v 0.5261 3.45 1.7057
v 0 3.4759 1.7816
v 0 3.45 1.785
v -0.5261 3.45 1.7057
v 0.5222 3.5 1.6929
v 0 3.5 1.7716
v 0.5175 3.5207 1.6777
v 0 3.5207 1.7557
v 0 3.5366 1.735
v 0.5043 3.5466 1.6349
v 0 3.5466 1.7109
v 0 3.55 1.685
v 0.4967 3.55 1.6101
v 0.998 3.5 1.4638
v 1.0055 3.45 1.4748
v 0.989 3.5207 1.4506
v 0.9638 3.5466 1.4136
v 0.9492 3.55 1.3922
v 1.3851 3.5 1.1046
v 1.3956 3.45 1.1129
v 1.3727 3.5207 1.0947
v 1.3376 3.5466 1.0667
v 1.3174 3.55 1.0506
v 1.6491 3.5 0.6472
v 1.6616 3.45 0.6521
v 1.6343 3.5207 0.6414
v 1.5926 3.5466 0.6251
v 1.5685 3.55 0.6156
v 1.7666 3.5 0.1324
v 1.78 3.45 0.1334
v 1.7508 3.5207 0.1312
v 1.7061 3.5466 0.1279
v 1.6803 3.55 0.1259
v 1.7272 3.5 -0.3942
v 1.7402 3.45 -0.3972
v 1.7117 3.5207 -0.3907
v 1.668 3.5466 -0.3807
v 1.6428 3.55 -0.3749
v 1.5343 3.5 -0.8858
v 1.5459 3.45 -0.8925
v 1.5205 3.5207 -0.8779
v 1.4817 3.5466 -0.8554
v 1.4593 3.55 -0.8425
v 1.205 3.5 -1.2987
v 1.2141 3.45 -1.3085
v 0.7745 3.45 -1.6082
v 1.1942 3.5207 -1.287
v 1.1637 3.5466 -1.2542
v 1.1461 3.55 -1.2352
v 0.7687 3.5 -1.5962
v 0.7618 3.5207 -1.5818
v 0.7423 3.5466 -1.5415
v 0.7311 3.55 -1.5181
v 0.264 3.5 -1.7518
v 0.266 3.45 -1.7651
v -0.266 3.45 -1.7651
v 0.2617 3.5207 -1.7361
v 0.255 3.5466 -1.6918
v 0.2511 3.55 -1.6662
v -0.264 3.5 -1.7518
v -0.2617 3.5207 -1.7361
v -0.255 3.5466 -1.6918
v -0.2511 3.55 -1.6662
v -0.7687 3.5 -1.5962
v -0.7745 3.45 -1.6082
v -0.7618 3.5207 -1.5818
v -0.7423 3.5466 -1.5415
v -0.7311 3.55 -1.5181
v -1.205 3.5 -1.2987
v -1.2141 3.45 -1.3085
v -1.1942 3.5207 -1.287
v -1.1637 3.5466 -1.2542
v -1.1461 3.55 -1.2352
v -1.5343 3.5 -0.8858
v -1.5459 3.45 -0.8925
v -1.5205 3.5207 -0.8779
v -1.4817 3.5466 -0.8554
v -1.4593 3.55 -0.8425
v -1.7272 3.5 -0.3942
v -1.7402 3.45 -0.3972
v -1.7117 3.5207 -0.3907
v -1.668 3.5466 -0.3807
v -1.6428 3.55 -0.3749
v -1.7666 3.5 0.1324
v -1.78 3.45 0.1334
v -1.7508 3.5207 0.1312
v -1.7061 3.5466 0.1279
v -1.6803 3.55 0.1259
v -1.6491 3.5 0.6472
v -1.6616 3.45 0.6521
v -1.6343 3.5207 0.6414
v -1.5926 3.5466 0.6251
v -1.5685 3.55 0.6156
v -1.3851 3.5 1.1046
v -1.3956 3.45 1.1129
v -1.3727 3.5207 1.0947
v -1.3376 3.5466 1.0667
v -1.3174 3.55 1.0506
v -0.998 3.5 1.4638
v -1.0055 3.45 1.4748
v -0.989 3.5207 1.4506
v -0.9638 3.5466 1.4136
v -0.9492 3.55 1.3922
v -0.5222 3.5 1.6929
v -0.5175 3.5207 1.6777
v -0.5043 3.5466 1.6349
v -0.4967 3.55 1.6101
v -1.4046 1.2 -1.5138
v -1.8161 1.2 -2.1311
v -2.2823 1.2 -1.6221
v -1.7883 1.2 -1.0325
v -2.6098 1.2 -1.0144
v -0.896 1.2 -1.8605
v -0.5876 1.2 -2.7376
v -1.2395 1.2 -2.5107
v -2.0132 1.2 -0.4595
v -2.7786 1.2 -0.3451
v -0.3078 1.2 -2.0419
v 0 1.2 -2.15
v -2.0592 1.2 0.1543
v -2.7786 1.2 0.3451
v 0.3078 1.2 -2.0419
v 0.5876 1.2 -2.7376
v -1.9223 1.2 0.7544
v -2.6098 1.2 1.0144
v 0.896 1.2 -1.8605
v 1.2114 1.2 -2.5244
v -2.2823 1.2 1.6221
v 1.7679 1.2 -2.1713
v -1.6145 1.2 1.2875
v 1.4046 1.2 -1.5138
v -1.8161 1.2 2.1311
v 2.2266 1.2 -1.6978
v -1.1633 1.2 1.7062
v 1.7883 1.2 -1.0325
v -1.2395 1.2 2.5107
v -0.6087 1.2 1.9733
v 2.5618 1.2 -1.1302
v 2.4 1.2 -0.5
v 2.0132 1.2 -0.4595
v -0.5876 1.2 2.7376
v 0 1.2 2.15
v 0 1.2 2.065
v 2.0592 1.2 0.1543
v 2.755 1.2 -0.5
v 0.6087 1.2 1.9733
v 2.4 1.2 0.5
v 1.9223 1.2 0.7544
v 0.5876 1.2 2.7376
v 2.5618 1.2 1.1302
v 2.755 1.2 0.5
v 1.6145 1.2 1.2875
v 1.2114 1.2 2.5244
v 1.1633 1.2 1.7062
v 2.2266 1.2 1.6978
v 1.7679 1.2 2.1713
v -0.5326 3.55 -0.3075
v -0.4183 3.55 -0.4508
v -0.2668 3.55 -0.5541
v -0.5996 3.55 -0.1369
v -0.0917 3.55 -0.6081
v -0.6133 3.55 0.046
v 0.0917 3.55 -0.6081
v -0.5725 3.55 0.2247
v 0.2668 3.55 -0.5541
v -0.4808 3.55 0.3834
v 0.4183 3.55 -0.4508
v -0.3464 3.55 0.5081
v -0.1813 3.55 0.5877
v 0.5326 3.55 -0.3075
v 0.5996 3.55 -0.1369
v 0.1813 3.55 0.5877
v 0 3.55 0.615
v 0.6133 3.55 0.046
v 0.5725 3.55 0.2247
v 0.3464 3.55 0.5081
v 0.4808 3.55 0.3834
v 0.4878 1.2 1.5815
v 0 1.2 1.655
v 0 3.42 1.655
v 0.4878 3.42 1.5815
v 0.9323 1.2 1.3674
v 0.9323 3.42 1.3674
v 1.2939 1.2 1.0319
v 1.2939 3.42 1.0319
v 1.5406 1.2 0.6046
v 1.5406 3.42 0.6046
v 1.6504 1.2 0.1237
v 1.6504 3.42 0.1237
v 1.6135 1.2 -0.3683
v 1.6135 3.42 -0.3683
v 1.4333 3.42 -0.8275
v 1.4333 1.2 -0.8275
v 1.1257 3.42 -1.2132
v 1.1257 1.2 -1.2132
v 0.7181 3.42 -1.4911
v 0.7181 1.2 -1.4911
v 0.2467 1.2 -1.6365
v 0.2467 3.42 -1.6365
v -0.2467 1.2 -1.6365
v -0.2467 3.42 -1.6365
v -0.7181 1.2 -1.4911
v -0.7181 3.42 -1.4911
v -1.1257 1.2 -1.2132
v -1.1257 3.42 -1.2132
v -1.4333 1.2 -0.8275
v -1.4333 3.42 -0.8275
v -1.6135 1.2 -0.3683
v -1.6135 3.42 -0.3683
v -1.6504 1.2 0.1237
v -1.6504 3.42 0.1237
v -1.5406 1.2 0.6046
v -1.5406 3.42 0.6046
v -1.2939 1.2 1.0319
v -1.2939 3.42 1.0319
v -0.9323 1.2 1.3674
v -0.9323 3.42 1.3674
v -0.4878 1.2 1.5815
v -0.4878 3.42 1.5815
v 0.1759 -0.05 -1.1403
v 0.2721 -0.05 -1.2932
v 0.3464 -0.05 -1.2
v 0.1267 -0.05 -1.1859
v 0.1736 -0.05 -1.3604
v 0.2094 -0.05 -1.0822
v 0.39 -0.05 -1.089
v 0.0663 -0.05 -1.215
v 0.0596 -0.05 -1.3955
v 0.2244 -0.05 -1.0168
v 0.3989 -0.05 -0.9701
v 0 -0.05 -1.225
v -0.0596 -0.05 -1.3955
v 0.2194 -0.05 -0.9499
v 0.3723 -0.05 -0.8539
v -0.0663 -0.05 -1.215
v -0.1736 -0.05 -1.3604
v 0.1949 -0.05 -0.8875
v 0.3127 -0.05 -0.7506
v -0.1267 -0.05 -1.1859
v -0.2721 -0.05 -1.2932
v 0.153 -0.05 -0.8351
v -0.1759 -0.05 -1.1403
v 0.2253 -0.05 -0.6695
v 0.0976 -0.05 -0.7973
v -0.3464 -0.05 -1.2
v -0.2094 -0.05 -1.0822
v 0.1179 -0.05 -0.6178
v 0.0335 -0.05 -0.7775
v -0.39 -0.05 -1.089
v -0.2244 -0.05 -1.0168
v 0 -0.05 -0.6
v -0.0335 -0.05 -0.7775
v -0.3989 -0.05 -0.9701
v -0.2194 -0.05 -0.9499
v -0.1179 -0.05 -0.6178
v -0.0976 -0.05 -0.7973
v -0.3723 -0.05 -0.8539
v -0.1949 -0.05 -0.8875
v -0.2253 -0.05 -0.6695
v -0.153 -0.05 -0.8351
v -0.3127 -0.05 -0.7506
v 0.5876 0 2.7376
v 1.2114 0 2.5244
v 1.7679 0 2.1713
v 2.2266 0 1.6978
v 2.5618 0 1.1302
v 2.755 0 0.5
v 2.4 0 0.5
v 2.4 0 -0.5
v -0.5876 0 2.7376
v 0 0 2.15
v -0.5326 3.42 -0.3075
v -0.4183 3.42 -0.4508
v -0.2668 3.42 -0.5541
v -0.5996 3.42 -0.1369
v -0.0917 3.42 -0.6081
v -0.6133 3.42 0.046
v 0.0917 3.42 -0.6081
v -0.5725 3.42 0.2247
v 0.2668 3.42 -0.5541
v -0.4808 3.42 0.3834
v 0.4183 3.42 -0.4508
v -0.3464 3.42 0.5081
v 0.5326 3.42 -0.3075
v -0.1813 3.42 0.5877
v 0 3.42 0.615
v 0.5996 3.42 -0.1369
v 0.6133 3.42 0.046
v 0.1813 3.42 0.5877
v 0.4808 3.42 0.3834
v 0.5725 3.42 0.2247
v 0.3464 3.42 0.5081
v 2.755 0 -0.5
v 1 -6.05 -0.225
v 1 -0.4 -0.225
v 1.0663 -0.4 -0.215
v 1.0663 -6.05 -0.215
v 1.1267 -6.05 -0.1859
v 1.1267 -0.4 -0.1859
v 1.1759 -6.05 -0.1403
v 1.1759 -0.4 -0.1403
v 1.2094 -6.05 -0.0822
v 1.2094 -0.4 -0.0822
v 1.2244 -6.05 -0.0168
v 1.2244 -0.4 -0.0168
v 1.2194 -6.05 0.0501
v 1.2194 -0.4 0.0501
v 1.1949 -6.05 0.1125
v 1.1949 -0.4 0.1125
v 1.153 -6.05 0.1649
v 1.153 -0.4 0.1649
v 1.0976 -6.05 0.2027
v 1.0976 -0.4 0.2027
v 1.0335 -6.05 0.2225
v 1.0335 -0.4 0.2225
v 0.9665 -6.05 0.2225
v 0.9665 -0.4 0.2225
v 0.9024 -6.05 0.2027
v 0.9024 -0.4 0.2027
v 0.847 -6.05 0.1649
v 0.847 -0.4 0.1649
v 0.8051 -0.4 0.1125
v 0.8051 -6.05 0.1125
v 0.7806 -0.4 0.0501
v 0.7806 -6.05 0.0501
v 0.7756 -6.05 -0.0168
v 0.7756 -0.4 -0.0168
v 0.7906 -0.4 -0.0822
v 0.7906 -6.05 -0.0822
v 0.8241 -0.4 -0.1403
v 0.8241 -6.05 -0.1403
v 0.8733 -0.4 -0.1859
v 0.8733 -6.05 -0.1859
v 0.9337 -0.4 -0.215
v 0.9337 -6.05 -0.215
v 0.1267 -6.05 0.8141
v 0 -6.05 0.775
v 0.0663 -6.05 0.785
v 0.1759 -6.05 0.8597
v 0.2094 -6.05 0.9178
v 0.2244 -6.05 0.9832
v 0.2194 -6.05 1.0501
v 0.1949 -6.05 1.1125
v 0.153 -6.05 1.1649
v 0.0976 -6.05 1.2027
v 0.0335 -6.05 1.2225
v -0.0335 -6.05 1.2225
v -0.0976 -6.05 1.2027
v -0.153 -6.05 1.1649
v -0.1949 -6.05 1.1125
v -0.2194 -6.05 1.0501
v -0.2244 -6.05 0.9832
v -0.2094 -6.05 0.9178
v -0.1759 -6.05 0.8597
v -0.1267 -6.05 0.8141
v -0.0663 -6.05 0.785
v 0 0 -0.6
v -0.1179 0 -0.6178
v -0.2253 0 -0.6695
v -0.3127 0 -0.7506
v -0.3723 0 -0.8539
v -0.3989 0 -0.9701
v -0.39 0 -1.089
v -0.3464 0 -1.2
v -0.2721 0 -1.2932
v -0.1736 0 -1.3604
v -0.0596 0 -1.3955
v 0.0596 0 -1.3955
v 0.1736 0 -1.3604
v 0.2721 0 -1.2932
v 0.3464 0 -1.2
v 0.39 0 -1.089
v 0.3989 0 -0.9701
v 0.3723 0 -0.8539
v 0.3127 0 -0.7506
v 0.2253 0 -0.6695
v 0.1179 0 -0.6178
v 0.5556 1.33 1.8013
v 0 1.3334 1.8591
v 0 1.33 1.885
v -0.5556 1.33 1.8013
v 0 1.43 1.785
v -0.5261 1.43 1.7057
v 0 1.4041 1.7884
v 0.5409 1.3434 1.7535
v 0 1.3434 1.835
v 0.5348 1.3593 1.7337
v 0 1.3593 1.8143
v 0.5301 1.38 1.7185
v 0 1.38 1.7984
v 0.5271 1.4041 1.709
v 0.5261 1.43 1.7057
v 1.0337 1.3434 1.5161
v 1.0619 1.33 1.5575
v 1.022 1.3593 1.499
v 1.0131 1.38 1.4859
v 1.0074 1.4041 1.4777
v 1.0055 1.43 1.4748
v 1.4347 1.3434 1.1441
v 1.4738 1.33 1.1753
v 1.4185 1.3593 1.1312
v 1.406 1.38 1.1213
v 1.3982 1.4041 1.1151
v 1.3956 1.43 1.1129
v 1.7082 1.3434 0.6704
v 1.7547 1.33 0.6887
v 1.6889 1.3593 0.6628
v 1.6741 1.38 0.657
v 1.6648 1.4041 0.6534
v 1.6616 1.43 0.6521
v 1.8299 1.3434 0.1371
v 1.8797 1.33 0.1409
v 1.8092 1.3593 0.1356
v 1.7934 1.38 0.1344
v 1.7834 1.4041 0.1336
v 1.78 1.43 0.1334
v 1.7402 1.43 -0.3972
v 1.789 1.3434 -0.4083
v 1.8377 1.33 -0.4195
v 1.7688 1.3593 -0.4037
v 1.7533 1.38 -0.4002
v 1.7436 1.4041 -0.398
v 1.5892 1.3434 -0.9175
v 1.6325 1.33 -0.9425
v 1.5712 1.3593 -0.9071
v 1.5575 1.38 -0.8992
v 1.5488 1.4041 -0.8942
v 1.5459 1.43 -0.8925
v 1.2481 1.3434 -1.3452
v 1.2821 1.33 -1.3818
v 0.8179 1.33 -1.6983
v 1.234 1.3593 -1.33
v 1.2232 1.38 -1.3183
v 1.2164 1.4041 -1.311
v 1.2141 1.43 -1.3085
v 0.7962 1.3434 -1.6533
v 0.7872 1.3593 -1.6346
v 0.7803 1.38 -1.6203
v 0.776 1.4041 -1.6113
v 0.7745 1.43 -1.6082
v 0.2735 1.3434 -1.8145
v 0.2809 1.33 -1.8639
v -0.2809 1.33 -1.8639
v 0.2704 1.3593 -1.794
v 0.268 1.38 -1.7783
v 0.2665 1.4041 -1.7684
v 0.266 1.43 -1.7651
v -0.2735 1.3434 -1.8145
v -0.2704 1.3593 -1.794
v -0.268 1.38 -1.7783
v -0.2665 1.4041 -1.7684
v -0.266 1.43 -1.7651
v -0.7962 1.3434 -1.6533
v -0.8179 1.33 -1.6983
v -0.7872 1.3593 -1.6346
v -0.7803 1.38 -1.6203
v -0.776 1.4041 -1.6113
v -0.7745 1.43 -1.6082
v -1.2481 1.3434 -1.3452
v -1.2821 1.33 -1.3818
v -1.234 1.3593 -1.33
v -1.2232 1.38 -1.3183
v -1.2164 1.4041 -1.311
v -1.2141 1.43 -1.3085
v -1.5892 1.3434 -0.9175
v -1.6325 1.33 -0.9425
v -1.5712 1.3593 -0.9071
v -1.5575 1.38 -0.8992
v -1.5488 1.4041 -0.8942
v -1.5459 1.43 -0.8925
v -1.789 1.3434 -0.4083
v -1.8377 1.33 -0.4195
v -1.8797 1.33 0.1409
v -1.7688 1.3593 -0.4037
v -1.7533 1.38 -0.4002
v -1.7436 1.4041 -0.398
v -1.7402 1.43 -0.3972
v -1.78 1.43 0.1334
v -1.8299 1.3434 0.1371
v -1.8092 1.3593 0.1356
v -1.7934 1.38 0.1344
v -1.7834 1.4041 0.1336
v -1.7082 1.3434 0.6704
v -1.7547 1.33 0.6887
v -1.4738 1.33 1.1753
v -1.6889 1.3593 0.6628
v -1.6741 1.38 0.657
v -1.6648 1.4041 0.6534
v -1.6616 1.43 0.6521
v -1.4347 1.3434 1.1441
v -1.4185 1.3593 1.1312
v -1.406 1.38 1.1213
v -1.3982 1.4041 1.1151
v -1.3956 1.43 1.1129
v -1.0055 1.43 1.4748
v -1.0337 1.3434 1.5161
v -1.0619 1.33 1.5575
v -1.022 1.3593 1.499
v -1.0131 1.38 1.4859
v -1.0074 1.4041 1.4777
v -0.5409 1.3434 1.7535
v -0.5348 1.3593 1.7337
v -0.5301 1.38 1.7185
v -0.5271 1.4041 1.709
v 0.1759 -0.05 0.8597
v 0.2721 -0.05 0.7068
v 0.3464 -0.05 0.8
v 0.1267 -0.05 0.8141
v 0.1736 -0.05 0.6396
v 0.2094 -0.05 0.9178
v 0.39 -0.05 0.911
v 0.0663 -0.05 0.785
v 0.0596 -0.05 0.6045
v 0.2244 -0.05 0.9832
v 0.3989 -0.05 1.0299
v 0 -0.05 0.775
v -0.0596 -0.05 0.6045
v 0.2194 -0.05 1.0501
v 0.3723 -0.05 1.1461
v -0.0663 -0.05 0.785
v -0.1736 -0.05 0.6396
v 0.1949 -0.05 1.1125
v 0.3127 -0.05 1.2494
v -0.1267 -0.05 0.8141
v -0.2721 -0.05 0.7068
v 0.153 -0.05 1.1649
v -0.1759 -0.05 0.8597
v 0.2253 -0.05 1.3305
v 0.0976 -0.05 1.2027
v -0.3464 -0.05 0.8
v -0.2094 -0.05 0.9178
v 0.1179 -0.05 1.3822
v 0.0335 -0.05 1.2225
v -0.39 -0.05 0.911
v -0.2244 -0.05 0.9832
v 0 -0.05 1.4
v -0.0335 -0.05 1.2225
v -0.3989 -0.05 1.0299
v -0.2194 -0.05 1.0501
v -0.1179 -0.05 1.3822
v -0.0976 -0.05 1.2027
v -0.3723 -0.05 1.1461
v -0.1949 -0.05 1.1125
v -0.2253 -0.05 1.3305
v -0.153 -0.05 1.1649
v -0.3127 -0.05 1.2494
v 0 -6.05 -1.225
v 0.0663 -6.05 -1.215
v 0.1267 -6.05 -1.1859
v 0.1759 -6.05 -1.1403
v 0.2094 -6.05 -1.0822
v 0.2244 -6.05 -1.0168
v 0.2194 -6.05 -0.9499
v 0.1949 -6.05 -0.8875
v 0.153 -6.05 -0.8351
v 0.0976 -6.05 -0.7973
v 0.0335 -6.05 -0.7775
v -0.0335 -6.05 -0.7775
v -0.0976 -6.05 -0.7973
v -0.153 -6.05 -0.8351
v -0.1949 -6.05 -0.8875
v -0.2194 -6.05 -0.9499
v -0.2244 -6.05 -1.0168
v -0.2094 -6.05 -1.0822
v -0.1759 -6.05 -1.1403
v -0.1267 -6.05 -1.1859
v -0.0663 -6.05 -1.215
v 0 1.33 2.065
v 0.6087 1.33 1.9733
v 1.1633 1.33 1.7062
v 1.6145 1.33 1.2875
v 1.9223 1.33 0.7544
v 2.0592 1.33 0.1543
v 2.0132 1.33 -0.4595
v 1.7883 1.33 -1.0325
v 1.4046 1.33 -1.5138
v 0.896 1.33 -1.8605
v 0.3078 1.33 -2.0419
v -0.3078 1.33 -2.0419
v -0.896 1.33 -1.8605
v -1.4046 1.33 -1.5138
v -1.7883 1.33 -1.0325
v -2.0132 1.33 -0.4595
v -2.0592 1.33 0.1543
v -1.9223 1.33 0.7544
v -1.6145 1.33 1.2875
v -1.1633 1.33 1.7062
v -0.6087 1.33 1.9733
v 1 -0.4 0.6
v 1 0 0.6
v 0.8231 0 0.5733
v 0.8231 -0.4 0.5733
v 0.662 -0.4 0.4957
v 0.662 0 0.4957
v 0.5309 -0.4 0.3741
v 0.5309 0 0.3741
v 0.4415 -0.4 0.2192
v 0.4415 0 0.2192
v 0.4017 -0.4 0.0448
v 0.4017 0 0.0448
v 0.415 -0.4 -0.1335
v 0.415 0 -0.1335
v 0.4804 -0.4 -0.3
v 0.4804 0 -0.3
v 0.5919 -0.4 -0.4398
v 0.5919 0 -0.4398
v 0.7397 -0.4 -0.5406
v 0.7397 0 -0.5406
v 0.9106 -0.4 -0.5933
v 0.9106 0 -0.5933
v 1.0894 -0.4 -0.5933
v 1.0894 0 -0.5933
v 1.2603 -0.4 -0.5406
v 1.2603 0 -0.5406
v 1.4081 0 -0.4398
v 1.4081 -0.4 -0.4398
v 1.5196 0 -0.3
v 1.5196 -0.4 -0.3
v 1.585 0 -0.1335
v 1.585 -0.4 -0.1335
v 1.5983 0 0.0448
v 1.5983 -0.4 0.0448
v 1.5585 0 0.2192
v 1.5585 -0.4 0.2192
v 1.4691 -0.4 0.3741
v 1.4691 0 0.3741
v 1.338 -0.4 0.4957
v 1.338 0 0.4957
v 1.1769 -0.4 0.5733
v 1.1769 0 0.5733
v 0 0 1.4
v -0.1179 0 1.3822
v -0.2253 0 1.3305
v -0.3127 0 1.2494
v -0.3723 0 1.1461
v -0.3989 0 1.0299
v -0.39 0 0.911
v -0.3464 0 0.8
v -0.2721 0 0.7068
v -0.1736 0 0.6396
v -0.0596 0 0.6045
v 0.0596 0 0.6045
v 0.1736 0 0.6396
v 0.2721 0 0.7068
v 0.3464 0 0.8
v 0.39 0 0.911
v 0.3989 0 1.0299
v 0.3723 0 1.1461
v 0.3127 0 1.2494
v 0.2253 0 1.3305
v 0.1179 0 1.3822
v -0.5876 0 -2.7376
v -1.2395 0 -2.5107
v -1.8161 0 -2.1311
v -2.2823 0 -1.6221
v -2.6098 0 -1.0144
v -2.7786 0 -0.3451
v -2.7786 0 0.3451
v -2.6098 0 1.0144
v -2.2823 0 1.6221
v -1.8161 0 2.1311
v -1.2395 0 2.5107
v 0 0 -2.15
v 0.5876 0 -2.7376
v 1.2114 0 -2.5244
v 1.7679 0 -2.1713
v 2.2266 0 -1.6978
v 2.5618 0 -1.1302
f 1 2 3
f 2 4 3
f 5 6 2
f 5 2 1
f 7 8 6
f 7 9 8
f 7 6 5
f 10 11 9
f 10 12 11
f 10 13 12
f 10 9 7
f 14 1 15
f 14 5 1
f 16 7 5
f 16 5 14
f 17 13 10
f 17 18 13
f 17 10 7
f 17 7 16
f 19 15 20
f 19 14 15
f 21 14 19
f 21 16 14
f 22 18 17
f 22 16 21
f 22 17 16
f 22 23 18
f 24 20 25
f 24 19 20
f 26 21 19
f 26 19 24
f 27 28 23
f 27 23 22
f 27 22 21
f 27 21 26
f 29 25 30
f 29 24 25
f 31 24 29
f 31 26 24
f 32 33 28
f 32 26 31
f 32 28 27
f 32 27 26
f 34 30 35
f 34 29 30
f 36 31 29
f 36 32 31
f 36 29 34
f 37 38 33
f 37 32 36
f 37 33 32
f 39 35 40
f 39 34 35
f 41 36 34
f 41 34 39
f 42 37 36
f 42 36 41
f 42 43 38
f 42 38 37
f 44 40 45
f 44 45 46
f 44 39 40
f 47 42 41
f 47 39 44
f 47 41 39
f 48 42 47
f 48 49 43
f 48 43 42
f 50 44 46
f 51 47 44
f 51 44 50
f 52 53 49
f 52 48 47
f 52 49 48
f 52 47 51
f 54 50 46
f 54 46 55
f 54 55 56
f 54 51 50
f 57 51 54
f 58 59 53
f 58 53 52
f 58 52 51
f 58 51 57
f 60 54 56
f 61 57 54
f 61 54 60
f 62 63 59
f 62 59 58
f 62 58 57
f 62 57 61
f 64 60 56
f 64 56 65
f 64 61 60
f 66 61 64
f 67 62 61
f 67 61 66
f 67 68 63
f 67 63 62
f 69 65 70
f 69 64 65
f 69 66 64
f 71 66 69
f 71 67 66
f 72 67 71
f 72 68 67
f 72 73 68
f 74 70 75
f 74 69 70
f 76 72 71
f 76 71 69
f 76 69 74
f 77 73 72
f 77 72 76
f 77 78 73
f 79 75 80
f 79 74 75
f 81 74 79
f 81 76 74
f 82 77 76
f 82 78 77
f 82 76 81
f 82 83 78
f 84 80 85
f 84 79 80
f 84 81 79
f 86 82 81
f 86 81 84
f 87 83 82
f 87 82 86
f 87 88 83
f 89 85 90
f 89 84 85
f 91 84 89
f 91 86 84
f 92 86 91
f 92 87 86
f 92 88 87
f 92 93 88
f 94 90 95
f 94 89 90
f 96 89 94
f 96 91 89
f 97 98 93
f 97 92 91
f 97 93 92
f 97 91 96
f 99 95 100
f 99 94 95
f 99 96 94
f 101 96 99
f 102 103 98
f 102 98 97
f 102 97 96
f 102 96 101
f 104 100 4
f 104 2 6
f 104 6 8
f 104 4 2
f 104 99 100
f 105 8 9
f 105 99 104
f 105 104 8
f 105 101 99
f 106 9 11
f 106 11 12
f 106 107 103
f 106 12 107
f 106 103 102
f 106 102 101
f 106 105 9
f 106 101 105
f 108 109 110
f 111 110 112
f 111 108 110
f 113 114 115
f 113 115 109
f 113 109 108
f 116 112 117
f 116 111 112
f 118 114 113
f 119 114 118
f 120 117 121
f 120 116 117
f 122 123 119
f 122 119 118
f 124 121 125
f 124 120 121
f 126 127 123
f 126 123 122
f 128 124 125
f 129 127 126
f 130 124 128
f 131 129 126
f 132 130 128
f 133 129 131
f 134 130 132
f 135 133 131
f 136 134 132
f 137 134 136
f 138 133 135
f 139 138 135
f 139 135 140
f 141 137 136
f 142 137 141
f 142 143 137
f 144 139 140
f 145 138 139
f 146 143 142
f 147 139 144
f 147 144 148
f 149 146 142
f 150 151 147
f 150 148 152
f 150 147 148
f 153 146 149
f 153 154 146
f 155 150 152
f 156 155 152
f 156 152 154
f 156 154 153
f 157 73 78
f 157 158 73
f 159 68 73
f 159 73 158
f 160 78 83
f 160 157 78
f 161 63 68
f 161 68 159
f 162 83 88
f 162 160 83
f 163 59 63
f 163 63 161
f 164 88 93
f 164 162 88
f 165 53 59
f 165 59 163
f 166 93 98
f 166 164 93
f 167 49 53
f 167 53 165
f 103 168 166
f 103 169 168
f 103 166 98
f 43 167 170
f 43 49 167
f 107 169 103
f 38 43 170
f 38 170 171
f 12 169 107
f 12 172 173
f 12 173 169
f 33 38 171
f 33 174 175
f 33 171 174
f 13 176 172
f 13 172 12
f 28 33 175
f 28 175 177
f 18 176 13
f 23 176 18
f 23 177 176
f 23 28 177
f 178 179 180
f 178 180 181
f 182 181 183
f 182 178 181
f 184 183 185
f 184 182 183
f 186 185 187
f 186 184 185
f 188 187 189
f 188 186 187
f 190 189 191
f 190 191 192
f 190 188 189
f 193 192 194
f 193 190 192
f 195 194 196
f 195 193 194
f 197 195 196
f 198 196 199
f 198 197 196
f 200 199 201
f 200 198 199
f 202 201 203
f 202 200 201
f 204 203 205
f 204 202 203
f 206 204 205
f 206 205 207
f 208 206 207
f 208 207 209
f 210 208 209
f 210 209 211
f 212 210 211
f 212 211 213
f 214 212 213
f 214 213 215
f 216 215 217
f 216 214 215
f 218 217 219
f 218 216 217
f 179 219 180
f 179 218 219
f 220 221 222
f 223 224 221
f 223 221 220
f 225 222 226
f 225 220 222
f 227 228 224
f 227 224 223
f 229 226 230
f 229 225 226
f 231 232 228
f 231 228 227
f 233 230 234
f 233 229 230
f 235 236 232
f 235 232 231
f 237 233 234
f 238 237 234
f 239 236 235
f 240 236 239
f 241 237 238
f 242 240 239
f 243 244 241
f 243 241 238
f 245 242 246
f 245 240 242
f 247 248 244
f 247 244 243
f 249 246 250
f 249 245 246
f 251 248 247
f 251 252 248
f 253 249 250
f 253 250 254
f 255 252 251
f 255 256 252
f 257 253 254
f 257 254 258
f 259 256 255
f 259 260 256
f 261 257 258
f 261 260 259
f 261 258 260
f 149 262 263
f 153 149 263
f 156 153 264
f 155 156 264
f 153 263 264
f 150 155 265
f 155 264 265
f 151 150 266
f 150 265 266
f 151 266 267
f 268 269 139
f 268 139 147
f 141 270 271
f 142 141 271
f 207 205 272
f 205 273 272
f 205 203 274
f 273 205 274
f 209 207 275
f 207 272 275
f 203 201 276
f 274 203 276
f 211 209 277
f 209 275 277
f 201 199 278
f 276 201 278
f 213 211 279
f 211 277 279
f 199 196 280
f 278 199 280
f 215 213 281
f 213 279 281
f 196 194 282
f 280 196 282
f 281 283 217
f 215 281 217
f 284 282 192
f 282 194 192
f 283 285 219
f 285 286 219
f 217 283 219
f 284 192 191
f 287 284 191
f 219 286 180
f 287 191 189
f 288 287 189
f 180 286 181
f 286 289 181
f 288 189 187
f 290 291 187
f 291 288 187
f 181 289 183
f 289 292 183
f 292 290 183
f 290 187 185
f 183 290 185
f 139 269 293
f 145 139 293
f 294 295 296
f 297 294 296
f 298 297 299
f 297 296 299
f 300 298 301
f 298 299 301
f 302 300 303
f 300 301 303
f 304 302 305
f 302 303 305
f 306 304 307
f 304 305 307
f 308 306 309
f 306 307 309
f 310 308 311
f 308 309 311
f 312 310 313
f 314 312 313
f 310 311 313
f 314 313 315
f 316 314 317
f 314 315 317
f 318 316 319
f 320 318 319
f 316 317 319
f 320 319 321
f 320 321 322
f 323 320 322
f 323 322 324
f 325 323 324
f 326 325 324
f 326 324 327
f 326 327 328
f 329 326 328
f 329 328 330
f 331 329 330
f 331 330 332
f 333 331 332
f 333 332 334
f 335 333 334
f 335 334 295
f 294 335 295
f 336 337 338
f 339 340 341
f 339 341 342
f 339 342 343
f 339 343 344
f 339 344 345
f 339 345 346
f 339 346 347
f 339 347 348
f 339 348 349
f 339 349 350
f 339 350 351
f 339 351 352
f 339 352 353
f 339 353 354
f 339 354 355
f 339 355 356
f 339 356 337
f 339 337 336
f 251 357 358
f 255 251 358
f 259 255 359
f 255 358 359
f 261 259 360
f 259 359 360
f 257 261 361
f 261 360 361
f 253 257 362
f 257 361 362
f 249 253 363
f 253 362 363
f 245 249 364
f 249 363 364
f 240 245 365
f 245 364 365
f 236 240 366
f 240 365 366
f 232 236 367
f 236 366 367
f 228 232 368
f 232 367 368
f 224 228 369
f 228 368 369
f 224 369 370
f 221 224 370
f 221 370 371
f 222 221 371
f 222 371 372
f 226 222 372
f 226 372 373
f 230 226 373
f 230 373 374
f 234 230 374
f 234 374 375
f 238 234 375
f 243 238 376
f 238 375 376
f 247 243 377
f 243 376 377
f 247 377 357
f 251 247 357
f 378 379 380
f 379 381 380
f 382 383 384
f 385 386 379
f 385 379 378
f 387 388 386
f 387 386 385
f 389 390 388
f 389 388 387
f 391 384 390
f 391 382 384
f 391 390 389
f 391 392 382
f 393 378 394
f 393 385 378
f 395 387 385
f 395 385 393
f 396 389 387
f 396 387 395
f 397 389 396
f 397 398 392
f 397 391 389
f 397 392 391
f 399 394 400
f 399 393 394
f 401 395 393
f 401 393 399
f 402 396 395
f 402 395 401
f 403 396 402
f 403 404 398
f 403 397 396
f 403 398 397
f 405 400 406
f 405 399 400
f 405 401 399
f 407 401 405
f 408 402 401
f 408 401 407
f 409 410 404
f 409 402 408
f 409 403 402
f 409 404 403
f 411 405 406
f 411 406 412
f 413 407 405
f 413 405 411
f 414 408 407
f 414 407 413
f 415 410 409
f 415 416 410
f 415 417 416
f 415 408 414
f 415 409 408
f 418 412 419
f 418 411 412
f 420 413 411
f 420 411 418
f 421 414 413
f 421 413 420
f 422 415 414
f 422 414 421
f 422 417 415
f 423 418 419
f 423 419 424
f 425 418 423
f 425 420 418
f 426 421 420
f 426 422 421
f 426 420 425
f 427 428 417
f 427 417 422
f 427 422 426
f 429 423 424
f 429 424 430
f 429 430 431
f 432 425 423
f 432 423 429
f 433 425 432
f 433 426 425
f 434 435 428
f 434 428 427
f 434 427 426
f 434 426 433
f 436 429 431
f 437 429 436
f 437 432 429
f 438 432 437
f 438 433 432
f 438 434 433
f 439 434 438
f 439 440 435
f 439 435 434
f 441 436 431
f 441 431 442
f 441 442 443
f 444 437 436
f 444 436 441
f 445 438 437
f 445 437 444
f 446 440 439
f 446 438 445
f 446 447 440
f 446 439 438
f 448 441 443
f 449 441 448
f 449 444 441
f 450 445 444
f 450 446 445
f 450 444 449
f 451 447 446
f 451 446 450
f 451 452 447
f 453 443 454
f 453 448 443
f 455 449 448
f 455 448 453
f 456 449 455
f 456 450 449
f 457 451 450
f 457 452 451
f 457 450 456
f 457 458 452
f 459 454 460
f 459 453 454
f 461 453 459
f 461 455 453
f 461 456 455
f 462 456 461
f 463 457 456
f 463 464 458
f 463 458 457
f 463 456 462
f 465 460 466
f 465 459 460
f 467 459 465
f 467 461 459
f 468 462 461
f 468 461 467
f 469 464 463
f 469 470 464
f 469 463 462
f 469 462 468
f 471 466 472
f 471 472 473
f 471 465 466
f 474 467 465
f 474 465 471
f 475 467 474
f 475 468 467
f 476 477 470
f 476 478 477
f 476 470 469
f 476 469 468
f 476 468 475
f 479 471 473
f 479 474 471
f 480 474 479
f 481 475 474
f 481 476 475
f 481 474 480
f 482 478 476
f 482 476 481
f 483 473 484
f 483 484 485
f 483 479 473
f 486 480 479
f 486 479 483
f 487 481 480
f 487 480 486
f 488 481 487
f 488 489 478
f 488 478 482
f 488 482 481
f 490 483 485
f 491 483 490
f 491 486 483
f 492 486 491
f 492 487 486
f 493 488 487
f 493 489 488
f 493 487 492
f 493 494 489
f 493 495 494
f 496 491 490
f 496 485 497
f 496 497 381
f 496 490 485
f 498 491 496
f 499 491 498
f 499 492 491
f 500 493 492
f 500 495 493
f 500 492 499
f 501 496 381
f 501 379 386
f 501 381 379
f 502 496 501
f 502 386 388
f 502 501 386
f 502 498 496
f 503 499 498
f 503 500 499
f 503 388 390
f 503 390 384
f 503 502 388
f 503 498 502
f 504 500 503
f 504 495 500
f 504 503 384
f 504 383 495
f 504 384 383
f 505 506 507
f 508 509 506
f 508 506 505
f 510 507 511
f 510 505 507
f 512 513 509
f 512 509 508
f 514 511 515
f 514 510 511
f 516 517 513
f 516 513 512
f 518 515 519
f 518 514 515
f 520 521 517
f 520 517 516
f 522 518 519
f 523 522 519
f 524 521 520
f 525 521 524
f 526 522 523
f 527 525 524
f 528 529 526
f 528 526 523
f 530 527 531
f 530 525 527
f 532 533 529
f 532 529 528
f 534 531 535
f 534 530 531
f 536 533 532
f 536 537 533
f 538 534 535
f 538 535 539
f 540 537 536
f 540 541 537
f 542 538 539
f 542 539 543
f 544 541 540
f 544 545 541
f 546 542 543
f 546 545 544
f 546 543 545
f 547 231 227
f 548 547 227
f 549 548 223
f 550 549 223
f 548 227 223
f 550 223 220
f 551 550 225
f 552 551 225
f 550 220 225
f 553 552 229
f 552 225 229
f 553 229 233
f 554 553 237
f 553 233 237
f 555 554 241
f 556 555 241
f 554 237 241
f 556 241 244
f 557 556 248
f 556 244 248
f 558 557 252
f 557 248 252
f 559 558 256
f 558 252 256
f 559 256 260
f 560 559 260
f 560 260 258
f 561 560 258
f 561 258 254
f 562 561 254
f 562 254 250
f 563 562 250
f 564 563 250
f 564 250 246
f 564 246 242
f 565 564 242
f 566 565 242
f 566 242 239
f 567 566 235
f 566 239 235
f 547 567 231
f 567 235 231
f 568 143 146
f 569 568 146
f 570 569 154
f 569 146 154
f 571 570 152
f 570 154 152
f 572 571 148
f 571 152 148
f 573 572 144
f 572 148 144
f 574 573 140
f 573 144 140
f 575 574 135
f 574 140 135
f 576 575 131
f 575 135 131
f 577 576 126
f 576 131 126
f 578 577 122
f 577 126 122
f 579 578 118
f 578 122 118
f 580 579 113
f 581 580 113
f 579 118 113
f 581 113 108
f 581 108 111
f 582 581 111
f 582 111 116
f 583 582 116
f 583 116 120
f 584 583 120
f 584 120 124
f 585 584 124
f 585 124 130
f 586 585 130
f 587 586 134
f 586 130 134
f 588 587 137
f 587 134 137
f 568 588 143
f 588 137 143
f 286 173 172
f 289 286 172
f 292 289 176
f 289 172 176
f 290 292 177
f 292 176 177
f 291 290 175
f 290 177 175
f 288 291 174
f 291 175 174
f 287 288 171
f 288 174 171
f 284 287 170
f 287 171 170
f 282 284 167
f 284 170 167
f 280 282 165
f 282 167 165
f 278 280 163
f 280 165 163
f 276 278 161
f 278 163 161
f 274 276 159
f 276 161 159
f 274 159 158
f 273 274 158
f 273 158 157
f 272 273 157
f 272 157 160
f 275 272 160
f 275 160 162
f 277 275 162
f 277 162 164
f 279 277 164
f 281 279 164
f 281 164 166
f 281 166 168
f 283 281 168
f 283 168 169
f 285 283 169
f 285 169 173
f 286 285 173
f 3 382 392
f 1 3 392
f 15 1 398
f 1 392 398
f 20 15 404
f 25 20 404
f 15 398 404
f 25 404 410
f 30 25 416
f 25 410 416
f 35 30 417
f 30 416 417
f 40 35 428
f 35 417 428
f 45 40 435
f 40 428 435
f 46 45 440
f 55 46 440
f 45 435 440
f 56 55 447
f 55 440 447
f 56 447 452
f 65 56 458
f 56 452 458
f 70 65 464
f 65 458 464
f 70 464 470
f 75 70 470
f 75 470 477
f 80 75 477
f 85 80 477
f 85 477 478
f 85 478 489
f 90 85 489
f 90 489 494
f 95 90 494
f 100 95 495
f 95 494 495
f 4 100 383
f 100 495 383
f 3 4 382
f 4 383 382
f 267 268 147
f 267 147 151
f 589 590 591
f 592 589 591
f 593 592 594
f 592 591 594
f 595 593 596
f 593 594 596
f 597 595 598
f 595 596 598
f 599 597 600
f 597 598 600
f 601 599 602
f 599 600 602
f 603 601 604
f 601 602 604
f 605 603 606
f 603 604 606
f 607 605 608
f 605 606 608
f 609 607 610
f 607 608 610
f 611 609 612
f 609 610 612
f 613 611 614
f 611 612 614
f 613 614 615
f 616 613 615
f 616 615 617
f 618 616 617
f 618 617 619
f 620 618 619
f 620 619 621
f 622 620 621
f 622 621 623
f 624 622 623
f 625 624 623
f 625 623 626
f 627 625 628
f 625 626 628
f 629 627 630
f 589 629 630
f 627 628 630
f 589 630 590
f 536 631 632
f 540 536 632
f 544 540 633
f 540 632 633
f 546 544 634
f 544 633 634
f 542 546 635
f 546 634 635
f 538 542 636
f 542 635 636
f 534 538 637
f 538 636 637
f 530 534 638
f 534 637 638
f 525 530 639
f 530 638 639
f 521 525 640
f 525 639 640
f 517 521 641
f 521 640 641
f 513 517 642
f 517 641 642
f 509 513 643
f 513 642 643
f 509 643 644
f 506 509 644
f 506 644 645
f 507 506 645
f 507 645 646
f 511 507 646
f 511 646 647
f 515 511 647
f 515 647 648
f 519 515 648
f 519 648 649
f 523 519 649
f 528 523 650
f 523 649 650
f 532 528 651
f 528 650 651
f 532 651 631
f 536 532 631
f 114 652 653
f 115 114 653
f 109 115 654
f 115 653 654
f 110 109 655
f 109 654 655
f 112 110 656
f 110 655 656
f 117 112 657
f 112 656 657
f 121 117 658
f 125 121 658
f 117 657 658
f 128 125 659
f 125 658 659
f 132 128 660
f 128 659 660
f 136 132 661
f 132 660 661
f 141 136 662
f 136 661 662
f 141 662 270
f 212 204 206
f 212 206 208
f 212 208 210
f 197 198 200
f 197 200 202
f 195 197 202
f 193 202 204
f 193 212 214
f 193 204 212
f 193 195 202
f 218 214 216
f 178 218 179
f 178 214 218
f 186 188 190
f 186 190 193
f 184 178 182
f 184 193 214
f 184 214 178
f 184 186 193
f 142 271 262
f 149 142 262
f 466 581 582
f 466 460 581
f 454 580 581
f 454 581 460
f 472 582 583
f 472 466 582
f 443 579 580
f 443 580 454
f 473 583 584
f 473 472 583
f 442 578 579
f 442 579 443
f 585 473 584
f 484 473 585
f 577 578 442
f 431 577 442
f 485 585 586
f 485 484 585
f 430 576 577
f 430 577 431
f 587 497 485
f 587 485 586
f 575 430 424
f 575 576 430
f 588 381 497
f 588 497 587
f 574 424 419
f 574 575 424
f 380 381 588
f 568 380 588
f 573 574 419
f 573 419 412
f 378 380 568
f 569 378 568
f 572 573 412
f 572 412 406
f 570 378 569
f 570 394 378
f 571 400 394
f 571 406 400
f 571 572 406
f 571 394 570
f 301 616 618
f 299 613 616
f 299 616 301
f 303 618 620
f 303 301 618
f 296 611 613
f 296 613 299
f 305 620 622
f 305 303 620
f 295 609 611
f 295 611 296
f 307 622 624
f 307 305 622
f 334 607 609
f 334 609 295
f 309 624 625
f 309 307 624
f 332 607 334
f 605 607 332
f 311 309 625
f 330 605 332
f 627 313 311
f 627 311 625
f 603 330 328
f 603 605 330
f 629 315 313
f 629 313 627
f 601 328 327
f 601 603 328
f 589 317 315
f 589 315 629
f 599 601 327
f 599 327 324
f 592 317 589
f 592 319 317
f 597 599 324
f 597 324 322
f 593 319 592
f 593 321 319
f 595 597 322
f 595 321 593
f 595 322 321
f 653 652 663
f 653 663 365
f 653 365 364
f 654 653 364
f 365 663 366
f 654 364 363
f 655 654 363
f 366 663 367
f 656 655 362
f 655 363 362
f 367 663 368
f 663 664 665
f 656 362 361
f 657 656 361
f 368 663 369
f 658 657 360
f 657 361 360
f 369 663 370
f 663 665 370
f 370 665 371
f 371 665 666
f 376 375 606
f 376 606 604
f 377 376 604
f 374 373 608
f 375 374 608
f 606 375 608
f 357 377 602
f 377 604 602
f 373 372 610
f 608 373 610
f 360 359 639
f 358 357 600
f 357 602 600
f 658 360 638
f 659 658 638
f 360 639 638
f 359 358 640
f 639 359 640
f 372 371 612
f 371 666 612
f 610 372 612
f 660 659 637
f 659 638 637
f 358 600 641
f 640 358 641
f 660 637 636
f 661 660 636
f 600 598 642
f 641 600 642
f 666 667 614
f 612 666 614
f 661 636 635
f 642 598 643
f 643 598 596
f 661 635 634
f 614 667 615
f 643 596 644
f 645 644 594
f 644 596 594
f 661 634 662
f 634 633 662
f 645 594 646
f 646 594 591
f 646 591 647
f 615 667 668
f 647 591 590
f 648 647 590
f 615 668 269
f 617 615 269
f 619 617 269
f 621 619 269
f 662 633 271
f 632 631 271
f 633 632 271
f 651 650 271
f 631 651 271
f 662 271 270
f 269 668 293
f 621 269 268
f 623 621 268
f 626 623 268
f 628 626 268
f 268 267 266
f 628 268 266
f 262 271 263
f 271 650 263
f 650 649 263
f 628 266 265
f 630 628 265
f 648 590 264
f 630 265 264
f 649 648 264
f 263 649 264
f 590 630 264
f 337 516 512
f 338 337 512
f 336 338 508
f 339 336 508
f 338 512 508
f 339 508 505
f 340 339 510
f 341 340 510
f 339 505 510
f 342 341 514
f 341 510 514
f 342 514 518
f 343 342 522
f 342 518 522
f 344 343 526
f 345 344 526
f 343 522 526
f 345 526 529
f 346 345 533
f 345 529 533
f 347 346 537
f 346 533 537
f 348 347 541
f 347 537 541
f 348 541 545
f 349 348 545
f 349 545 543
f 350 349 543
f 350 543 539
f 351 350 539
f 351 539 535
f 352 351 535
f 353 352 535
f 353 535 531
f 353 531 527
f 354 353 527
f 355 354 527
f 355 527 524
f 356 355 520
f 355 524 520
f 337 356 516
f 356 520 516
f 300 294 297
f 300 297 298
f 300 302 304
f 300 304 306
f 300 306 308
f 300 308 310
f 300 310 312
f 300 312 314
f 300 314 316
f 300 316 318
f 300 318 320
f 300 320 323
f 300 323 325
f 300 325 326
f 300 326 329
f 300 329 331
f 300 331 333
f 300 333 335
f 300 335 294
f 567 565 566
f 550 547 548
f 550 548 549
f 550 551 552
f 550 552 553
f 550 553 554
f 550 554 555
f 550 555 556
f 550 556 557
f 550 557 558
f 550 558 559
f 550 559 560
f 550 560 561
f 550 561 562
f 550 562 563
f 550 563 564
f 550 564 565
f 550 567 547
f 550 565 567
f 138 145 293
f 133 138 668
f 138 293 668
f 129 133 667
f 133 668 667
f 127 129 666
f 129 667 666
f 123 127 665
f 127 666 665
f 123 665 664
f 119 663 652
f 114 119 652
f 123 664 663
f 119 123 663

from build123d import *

# Parameters (mm, degrees)
SKETCH1_R           = 2.8
BOSS_EXTRUDE1_DEPTH = 1.2
SKETCH2_R           = 2.065
BOSS_EXTRUDE2_DEPTH = 0.13
SKETCH3_R           = 1.785
BOSS_EXTRUDE3_DEPTH = 2.22
SKETCH4_R           = 0.615
CUT_EXTRUDE1_DEPTH  = 1
SKETCH5_R           = 0.4
BOSS_EXTRUDE4_DEPTH = 0.05
SKETCH6_W           = 0.4
SKETCH6_H           = 1
CUT_EXTRUDE2_DEPTH  = 6.31812937
SKETCH7_R           = 0.6
BOSS_EXTRUDE5_DEPTH = 0.4
SKETCH8_R           = 0.225
BOSS_EXTRUDE6_DEPTH = 6
FILLET1_R           = 0.1
SKETCH9_R           = 1.655
CUT_EXTRUDE3_DEPTH  = 2.22


with BuildPart() as part:
    # Sketch1 → Boss-Extrude1 (new body)
    with BuildSketch(Plane(origin=(0, 0, 0), x_dir=(1, 0, 0), z_dir=(0, 1, 0))):
        with Locations(Location((0, 0, 0), (0, 0, 270))):
            Circle(SKETCH1_R)
    extrude(amount=BOSS_EXTRUDE1_DEPTH)

    # Sketch2 → Boss-Extrude2 (add)
    with BuildSketch(Plane(origin=(0, 1.2, 0), x_dir=(1, 0, 0), z_dir=(0, 1, 0))):
        with Locations(Location((0, 0, 0), (0, 0, 270))):
            Circle(SKETCH2_R)
    extrude(amount=BOSS_EXTRUDE2_DEPTH)

    # Sketch3 → Boss-Extrude3 (add)
    with BuildSketch(Plane(origin=(0, 1.33, 0), x_dir=(1, 0, 0), z_dir=(0, 1, 0))):
        with Locations(Location((0, 0, 0), (0, 0, 270))):
            Circle(SKETCH3_R)
    extrude(amount=BOSS_EXTRUDE3_DEPTH)

    # Sketch4 → Cut-Extrude1 (cut)
    with BuildSketch(Plane(origin=(0, 3.55, 0), x_dir=(1, 0, 0), z_dir=(0, 1, 0))):
        with Locations(Location((0, 0, 0), (0, 0, 270))):
            Circle(SKETCH4_R)
    extrude(amount=-CUT_EXTRUDE1_DEPTH, mode=Mode.SUBTRACT)

    # Sketch5 → Boss-Extrude4 (add)
    with BuildSketch(Plane.XZ):
        with Locations(Location((0, 1, 0), (0, 0, 90))):
            Circle(SKETCH5_R)
        with Locations(Location((0, -1, 0), (0, 0, 90))):
            Circle(SKETCH5_R)
    extrude(amount=BOSS_EXTRUDE4_DEPTH)

    # Sketch6 → Cut-Extrude2 (cut, through all)
    with BuildSketch(Plane.XZ):
        Polygon((0, 2.15), (0.65, 2.8), (-0.65, 2.8), align=None)
        with Locations((2.6, 0)):
            Rectangle(SKETCH6_W, SKETCH6_H)
        Polygon((0, -2.15), (-0.65, -2.8), (0.65, -2.8), align=None)
    extrude(amount=-CUT_EXTRUDE2_DEPTH, mode=Mode.SUBTRACT)

    # Sketch7 → Boss-Extrude5 (add)
    with BuildSketch(Plane.XZ):
        with Locations(Location((1, 0, 0), (0, 0, 90))):
            Circle(SKETCH7_R)
    extrude(amount=BOSS_EXTRUDE5_DEPTH)

    # Sketch8 → Boss-Extrude6 (add)
    with BuildSketch(Plane.XZ.offset(0.05)):
        with Locations(Location((0, 1, 0), (0, 0, 270))):
            Circle(SKETCH8_R)
        with Locations(Location((0, -1, 0), (0, 0, 270))):
            Circle(SKETCH8_R)
        with Locations(Location((1, 0, 0), (0, 0, 270))):
            Circle(SKETCH8_R)
    extrude(amount=BOSS_EXTRUDE6_DEPTH)

    # Fillet1
    fillet1_edges = [part.edges().sort_by_distance(p)[0] for p in [
        (0, 1.33, -1.785),
        (0, 3.55, -1.785),
    ]]
    fillet(fillet1_edges, radius=FILLET1_R)

    # Sketch9 → Cut-Extrude3 (cut)
    with BuildSketch(Plane(origin=(0, 1.2, 0), x_dir=(1, 0, 0), z_dir=(0, 1, 0))):
        with Locations(Location((0, 0, 0), (0, 0, 270))):
            Circle(SKETCH9_R)
    extrude(amount=CUT_EXTRUDE3_DEPTH, mode=Mode.SUBTRACT)


solid = part.part
